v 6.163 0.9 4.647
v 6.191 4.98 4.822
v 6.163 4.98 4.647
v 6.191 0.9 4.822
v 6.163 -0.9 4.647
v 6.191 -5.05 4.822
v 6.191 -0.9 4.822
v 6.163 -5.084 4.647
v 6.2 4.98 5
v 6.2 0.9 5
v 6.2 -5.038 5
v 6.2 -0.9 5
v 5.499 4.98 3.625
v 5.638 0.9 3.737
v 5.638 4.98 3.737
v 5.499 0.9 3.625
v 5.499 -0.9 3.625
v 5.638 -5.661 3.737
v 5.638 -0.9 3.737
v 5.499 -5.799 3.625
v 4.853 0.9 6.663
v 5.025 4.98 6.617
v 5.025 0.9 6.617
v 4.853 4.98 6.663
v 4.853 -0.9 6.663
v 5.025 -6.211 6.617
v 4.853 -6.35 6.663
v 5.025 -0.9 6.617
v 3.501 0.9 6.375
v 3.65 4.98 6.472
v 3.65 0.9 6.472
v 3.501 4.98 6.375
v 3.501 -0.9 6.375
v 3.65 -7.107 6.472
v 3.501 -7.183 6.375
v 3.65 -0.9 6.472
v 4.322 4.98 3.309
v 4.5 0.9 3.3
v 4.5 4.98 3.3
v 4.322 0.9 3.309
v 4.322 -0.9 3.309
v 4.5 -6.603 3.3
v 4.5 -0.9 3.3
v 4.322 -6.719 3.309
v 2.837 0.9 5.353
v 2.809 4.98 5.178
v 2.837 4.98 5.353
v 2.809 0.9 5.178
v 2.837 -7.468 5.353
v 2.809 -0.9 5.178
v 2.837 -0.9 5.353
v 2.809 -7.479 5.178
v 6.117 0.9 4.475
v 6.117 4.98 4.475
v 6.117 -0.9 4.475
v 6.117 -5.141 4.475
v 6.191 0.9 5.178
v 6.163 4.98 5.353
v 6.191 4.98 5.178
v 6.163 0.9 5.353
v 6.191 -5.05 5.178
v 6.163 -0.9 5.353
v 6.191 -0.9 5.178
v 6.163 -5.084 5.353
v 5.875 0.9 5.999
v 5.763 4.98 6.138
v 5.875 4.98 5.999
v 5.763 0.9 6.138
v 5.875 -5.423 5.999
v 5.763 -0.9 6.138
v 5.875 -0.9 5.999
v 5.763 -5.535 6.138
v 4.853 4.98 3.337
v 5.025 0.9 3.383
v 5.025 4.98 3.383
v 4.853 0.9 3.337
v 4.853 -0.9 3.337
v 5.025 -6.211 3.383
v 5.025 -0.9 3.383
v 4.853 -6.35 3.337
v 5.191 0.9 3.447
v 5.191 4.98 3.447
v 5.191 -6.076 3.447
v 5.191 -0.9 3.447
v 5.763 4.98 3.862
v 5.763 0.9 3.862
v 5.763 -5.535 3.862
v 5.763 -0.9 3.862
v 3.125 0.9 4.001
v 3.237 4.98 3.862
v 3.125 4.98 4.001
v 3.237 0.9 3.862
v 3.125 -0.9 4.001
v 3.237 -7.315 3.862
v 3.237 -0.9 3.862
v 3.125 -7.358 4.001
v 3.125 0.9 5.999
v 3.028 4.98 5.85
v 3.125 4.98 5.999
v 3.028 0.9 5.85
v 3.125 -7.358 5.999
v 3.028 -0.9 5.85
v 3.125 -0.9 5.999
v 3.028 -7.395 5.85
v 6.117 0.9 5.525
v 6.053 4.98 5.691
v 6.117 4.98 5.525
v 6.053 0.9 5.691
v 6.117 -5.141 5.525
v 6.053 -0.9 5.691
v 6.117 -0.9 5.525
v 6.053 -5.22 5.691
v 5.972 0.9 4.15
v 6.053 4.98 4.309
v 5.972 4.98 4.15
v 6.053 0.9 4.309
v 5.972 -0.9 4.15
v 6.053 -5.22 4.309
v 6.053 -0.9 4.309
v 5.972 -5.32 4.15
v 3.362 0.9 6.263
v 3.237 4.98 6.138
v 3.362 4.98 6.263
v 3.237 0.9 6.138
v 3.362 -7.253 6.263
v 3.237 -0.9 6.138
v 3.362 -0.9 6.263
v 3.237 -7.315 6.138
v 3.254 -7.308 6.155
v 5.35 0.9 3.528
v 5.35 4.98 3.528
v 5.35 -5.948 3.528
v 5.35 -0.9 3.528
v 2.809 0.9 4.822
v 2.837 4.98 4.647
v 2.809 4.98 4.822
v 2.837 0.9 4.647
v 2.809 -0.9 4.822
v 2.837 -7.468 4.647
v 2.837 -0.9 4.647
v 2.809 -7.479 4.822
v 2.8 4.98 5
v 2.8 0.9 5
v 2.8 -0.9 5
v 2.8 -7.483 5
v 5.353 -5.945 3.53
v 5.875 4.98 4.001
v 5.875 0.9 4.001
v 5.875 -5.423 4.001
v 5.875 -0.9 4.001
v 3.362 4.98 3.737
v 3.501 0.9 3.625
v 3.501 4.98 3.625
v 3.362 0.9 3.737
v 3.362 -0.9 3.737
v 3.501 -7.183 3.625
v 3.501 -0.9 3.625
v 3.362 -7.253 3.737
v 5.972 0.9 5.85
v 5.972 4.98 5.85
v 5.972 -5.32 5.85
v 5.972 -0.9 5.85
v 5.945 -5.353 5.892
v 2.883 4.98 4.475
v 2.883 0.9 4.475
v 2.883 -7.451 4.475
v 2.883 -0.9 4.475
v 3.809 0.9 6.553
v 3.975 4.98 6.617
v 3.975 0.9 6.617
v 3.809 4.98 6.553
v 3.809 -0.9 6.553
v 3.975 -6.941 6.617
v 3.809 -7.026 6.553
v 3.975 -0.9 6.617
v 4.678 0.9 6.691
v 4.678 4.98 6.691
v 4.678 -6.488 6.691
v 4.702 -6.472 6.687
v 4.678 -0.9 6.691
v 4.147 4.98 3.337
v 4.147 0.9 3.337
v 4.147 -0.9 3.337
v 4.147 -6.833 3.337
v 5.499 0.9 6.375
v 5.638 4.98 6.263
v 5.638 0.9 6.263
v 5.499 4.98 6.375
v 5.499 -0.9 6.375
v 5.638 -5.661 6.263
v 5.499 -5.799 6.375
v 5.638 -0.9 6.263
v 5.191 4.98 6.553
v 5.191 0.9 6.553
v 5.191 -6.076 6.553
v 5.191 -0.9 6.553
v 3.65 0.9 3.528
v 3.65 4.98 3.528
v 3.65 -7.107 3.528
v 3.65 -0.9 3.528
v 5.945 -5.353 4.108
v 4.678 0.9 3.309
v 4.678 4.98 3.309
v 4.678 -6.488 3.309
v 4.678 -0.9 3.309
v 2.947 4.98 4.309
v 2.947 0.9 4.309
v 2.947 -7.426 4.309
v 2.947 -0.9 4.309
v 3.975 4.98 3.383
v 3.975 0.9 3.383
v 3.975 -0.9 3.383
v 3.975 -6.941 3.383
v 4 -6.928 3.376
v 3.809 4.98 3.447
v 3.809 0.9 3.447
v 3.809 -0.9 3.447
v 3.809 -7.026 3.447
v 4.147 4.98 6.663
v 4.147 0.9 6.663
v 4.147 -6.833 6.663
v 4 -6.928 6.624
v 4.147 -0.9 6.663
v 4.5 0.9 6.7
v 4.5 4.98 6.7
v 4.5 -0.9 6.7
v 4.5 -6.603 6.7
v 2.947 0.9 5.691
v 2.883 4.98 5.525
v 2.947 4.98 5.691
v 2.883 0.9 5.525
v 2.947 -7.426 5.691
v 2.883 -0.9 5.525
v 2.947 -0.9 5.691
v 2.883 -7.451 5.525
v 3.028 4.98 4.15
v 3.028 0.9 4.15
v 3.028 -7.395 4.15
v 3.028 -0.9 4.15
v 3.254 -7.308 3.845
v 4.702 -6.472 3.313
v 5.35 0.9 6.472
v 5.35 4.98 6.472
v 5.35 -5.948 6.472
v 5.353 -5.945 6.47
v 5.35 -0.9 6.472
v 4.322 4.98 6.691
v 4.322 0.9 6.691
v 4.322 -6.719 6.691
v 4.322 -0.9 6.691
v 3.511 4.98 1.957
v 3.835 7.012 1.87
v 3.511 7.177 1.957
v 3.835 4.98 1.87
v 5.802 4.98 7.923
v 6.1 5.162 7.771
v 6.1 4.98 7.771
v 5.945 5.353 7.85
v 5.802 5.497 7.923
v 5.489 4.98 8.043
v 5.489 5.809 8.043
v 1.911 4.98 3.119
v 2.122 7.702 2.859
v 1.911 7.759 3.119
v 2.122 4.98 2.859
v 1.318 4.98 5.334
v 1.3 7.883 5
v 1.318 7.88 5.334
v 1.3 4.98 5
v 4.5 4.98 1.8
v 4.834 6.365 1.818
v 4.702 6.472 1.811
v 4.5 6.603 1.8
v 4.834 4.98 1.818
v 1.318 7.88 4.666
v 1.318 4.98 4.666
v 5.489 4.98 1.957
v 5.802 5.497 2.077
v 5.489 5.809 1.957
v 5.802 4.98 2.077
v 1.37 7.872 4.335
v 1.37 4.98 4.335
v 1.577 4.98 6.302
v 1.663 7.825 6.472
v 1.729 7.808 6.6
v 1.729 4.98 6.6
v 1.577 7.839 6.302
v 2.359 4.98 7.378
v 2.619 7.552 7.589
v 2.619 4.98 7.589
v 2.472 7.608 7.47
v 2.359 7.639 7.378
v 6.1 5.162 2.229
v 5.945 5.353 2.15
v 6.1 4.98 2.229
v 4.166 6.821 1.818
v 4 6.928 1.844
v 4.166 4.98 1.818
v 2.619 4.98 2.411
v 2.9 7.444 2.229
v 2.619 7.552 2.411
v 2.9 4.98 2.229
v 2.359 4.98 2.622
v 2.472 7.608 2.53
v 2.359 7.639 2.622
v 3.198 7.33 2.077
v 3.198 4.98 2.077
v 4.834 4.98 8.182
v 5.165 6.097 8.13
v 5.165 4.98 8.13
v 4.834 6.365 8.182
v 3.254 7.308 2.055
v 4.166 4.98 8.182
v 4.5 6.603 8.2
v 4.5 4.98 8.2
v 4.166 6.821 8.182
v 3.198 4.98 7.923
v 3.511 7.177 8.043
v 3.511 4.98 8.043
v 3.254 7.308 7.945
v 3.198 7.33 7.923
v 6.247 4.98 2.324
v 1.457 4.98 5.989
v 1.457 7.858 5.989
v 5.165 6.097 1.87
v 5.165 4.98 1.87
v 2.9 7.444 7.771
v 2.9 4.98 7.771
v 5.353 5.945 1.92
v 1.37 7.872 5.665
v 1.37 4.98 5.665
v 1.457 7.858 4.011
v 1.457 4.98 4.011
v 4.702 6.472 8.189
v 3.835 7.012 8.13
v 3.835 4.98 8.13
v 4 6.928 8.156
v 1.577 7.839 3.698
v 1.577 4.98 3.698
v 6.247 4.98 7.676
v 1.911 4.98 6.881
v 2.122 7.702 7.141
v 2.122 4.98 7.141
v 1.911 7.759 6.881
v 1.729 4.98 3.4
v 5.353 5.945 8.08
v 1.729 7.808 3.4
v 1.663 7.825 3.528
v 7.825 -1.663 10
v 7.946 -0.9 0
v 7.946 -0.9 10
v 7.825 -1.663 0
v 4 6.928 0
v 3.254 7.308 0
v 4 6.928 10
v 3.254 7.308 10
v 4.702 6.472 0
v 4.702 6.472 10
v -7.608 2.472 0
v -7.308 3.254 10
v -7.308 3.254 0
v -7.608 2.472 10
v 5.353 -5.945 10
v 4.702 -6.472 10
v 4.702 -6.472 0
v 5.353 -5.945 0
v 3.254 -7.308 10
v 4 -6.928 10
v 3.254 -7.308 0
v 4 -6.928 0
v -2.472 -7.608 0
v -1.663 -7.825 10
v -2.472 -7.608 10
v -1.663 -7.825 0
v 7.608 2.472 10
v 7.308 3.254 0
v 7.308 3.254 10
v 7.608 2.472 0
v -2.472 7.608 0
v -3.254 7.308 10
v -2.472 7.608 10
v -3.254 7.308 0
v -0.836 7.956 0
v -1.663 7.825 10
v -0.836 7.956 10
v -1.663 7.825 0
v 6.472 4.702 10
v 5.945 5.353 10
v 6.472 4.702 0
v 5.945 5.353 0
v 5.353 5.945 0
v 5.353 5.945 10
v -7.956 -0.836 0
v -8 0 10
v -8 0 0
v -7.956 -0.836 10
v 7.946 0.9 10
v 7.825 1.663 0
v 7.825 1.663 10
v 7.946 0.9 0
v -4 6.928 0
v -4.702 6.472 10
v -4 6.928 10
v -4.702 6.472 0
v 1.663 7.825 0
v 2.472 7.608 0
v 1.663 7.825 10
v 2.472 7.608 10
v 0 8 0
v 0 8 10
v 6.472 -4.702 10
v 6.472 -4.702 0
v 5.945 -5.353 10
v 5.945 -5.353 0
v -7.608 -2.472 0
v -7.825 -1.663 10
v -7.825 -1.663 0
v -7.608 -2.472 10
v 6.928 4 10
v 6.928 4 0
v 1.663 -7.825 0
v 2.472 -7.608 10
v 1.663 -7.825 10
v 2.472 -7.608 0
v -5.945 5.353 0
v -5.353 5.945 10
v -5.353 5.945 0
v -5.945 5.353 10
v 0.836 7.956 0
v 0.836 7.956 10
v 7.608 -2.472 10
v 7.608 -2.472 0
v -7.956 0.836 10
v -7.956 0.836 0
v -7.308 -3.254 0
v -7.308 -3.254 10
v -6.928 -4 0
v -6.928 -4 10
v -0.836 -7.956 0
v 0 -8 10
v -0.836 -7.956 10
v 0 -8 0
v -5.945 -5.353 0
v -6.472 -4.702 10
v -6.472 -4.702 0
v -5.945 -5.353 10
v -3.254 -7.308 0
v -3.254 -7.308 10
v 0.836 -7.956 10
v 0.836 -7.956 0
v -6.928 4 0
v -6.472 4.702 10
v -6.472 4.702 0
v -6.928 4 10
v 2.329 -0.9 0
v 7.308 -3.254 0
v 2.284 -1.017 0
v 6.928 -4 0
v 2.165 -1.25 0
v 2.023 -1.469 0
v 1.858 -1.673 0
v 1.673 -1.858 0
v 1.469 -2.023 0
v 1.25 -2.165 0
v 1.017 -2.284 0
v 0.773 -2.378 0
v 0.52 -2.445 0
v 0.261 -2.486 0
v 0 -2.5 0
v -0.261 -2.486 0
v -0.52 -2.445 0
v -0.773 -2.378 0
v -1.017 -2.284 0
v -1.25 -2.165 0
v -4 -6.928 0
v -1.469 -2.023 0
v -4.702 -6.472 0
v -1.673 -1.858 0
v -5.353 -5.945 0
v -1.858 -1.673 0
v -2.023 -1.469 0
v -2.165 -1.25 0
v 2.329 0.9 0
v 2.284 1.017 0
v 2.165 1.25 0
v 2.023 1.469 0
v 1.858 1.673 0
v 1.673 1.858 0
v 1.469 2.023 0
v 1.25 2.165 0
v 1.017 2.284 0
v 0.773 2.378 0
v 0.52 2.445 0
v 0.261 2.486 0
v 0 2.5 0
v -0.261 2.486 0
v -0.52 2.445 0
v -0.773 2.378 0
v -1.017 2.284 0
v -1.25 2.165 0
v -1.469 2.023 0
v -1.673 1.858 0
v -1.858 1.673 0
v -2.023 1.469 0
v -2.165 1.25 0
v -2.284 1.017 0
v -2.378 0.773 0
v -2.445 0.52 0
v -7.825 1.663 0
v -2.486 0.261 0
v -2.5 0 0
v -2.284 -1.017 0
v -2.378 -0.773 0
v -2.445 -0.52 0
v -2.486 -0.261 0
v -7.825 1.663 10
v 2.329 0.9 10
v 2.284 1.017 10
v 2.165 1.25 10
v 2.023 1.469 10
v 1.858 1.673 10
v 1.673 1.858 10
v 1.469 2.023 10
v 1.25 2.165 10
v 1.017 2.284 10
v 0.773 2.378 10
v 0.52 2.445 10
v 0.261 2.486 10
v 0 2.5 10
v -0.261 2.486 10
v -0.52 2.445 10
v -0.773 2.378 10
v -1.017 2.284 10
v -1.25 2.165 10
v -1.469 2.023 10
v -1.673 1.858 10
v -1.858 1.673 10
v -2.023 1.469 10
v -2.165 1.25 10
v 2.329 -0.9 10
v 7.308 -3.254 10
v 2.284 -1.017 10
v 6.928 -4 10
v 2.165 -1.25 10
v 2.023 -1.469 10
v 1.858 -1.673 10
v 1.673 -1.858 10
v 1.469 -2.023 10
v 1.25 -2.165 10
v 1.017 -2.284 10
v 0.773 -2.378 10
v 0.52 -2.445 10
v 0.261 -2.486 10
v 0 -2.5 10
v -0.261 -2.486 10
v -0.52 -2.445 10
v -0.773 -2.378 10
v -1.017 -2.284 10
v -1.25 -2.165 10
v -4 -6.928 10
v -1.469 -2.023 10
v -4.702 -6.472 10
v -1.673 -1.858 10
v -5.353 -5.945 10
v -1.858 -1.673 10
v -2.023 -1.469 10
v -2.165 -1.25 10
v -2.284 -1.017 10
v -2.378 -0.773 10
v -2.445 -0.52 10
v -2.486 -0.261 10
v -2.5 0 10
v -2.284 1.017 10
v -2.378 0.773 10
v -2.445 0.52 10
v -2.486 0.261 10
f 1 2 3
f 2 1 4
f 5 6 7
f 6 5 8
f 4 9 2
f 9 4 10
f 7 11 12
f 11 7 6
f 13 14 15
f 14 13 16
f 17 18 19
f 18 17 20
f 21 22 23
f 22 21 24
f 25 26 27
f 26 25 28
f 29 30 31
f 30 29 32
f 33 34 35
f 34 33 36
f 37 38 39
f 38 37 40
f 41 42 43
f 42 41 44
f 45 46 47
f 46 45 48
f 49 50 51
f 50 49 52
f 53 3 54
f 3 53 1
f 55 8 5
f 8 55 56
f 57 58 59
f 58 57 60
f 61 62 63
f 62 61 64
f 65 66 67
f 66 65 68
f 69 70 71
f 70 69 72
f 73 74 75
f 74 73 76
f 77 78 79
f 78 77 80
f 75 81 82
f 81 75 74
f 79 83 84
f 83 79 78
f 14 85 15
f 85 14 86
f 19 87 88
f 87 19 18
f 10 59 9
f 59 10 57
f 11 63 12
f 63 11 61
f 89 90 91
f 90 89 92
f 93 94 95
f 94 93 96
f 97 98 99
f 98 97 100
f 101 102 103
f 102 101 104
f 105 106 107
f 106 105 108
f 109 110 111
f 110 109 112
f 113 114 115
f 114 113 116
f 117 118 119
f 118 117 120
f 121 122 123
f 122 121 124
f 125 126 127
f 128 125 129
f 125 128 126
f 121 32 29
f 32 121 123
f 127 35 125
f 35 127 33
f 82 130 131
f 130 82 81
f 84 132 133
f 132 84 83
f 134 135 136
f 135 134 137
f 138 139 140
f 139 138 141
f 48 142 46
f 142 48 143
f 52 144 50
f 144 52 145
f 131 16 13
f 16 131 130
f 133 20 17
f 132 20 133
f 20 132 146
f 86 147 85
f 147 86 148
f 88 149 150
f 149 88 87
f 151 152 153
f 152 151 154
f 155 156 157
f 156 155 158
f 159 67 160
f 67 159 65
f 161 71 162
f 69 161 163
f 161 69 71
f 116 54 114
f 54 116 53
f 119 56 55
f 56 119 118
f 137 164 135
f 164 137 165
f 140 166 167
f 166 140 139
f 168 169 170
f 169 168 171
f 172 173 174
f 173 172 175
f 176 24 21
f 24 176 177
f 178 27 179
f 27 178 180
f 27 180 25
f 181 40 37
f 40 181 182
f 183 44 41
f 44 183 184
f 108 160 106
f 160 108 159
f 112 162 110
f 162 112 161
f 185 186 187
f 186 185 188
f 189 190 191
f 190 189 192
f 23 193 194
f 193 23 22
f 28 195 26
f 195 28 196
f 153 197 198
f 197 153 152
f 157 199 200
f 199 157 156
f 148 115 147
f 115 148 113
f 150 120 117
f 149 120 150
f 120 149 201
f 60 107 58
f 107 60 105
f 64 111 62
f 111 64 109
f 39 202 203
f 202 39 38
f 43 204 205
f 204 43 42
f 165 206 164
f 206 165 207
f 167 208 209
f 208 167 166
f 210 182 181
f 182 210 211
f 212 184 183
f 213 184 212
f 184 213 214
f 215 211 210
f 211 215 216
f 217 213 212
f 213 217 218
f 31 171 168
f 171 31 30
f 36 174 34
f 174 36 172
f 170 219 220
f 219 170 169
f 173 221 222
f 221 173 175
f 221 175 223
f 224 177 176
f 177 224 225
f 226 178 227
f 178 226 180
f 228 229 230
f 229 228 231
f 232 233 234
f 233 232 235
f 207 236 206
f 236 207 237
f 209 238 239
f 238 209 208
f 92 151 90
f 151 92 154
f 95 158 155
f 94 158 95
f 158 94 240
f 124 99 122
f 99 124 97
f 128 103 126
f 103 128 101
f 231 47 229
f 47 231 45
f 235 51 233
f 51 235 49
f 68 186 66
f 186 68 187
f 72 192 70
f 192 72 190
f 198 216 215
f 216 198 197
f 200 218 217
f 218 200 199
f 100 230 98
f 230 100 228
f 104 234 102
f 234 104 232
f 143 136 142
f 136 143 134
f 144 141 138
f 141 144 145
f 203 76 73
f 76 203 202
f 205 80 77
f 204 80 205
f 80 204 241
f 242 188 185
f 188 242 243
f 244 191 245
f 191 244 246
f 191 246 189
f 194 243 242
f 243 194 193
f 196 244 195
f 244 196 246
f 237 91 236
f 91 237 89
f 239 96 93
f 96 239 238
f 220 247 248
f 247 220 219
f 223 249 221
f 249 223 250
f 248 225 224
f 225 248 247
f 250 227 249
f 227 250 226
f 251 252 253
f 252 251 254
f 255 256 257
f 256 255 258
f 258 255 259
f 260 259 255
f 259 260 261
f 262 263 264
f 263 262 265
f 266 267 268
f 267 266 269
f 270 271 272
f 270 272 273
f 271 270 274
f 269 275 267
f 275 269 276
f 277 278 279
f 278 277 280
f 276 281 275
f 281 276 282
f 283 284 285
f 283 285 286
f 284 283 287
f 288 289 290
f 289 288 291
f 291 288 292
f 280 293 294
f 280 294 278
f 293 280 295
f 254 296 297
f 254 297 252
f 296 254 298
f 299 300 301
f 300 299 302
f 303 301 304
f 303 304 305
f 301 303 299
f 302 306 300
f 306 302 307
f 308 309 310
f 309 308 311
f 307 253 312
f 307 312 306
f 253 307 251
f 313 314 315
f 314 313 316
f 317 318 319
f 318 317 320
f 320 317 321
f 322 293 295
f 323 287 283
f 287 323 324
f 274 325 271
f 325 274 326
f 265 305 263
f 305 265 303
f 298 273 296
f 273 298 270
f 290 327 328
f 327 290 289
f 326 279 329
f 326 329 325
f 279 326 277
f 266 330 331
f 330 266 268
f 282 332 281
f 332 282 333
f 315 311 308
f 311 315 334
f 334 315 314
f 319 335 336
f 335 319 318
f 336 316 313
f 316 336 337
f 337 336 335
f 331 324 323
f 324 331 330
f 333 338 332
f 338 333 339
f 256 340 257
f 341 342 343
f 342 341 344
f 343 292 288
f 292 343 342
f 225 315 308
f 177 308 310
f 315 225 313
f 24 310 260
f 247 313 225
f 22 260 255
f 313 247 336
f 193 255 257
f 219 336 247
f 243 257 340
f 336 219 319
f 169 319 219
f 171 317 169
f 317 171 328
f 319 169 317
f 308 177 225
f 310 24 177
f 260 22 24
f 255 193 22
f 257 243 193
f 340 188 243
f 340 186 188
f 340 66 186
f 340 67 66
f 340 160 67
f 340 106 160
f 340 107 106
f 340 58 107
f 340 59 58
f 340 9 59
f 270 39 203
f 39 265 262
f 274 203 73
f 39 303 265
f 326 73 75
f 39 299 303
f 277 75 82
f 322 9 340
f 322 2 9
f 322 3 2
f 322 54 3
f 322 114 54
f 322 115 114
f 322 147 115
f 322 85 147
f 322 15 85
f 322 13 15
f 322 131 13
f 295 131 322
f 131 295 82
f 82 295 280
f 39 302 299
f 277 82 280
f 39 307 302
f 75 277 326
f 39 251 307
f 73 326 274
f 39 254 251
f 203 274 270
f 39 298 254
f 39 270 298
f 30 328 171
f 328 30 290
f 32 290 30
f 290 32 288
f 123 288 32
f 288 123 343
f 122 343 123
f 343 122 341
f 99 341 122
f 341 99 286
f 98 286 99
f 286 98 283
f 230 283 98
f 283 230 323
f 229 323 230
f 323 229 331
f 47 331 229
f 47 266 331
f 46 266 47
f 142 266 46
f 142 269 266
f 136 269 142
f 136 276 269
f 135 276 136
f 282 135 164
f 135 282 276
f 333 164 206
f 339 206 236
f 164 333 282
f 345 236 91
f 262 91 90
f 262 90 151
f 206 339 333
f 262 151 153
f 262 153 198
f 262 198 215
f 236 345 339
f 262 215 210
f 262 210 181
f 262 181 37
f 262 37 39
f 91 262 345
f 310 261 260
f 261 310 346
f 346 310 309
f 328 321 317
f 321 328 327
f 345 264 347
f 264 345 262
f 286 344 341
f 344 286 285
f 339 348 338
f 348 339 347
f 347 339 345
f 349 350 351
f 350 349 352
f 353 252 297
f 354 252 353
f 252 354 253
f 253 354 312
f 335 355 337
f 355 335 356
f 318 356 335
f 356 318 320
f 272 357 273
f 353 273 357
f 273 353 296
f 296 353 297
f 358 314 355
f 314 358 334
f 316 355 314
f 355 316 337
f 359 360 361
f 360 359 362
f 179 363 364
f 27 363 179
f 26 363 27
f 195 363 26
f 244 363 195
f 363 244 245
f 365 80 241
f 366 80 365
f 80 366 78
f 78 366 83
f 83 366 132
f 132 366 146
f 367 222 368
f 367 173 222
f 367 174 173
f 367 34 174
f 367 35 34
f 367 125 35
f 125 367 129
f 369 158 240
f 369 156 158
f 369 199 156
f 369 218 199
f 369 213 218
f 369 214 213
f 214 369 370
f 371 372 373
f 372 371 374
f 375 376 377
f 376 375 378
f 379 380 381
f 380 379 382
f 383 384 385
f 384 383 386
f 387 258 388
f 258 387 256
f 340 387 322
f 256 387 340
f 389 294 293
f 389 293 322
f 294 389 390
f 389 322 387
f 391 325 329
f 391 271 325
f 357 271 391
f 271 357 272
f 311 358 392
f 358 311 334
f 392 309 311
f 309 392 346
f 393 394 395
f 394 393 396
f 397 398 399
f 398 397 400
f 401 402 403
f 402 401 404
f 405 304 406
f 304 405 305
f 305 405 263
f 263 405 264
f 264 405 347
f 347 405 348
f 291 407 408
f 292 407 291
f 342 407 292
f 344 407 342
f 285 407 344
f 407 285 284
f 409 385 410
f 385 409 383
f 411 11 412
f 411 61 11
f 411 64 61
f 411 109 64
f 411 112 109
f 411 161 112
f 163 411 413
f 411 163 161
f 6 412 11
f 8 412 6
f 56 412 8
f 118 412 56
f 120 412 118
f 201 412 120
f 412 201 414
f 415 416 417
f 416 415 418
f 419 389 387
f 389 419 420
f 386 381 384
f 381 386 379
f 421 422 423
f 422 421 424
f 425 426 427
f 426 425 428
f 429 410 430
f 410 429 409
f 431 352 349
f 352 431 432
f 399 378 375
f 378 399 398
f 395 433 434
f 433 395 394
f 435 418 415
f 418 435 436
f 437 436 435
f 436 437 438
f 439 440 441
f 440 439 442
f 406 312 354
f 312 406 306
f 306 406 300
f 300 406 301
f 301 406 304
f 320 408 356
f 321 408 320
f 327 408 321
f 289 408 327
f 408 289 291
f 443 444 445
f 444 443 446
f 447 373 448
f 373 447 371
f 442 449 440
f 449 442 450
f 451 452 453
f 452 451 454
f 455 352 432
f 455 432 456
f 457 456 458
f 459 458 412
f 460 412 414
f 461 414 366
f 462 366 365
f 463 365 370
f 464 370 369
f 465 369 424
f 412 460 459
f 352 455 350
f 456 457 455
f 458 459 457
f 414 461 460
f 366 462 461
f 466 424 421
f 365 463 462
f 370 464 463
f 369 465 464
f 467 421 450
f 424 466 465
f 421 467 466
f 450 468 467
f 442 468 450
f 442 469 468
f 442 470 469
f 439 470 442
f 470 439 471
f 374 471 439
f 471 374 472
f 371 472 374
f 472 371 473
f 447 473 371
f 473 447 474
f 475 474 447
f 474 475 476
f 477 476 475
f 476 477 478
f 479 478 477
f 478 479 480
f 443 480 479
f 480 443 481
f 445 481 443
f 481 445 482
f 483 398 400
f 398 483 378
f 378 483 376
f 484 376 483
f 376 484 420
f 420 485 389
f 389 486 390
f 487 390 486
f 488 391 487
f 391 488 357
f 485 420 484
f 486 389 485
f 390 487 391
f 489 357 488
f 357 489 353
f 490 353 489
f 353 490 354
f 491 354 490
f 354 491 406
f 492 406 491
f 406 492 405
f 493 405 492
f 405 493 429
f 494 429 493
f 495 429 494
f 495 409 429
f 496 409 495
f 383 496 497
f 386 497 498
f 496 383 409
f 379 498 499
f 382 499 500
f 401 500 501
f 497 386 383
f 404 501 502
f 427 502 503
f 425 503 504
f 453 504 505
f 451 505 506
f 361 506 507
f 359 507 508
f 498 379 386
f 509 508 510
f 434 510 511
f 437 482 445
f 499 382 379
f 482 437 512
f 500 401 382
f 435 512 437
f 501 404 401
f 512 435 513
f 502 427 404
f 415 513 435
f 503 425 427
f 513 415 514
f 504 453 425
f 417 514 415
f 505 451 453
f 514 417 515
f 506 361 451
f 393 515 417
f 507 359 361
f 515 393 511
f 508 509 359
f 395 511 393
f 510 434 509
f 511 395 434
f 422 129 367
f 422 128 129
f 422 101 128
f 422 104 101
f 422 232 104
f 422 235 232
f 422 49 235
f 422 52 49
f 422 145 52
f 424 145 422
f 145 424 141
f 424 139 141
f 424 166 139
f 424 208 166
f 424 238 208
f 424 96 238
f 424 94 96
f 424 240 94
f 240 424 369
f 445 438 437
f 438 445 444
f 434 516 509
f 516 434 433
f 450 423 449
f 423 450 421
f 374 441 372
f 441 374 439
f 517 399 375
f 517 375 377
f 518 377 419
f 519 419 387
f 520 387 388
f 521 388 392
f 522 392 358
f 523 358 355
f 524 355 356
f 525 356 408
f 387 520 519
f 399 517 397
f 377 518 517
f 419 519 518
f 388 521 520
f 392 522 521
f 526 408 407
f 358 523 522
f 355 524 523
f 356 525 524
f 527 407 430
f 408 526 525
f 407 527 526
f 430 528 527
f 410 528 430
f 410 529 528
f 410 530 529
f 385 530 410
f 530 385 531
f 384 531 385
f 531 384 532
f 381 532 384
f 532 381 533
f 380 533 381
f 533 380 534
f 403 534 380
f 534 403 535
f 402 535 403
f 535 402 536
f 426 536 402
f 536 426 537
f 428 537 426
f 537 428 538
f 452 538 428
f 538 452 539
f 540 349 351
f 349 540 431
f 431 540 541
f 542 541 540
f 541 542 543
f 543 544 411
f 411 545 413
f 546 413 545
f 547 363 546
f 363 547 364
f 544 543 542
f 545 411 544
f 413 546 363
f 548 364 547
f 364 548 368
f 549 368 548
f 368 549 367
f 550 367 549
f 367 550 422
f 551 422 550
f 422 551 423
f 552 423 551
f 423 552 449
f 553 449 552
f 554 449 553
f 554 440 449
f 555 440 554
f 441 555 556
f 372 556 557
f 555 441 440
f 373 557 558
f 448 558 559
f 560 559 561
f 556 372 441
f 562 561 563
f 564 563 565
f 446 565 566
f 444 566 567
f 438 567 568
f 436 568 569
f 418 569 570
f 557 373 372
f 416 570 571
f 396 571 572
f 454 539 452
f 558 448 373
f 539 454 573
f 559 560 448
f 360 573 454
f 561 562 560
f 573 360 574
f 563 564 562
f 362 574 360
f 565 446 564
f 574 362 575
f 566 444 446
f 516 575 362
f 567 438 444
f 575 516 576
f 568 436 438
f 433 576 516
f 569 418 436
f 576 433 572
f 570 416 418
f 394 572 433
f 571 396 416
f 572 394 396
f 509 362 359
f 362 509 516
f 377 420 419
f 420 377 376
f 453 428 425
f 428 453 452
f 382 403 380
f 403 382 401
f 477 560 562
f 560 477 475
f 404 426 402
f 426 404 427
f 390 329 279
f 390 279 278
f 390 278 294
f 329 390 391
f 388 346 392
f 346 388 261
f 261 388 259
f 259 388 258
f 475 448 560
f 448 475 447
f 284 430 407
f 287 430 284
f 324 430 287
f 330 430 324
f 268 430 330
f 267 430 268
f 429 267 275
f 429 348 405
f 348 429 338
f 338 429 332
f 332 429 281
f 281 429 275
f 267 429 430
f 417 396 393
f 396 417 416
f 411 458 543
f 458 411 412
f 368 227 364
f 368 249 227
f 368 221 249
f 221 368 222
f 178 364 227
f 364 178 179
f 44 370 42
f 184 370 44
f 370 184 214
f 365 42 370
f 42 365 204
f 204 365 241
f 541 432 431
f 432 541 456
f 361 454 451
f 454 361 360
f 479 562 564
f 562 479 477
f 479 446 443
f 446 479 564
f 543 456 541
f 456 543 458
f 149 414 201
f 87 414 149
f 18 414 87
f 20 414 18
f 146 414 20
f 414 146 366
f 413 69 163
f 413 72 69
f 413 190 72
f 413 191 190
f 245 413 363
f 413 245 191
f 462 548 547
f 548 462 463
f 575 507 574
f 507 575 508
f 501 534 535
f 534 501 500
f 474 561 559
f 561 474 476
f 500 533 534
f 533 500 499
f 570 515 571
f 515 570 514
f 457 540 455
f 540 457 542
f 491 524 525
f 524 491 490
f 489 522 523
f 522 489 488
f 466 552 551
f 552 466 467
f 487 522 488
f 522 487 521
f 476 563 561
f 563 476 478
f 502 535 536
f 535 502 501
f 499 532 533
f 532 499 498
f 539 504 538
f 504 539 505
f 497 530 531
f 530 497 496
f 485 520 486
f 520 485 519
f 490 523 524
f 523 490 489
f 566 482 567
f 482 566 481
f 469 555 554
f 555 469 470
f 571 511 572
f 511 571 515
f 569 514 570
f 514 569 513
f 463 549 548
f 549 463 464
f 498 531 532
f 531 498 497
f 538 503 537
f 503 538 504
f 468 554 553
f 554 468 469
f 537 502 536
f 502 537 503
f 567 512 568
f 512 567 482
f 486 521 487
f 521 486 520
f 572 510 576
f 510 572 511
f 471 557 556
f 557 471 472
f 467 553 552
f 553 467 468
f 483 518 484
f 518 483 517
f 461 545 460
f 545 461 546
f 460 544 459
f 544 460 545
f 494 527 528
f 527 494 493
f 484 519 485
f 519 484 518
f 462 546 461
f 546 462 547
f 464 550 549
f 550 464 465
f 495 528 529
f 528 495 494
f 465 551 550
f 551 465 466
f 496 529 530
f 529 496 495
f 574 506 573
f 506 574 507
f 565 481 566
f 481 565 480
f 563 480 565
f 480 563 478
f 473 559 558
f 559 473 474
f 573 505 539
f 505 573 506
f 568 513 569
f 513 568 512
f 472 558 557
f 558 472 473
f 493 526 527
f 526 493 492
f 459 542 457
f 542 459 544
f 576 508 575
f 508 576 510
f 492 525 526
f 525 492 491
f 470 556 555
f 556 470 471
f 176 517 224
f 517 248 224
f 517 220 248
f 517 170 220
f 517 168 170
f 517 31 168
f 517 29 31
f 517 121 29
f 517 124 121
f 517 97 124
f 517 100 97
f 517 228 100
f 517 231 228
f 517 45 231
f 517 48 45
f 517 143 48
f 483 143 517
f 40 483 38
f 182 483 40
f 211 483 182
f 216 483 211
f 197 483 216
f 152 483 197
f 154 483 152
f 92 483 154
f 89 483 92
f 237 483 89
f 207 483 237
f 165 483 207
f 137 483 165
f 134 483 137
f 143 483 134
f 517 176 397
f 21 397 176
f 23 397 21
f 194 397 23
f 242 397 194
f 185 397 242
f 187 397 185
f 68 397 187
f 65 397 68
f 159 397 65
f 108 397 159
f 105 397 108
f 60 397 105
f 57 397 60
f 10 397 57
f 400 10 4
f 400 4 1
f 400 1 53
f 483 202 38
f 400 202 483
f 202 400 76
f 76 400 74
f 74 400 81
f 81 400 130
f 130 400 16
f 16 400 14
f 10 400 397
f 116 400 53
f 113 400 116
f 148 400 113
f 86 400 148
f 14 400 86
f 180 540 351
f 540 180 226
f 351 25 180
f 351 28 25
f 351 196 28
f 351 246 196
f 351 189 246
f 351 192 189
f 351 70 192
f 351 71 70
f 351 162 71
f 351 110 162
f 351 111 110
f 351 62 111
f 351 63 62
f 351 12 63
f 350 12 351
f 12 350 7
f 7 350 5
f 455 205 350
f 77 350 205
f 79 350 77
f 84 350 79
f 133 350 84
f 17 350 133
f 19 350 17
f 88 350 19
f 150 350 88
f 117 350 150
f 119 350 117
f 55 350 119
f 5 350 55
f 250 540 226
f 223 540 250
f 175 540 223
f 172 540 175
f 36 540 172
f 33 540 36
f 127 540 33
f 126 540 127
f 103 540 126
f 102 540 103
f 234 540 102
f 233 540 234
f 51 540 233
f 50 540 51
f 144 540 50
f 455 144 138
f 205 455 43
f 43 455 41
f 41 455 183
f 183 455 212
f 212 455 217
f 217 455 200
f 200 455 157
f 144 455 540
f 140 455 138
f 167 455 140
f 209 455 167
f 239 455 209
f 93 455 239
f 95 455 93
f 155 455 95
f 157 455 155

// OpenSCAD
// Split shaft collar 5 mm: one-piece C-style split shaft collar.
$fn = 60;
eps = 0.02;
shaft_d = 5;
outer_d = 16;
width = 10;
slit_w = 1.8;
clamp_screw_d = 3.4;
head_d = 6.4;

module clamp_bore() {
    translate([outer_d / 2 - 3.5, -outer_d / 2 - eps, width / 2])
        rotate([-90, 0, 0]) cylinder(d = clamp_screw_d, h = outer_d + 2 * eps);
    translate([outer_d / 2 - 3.5, outer_d / 2 - 3 - eps, width / 2])
        rotate([-90, 0, 0]) cylinder(d = head_d, h = 3 + 2 * eps);
}

difference() {
    cylinder(d = outer_d, h = width);
    translate([0, 0, -eps]) cylinder(d = shaft_d, h = width + 2 * eps);
    translate([0, -slit_w / 2, -eps]) cube([outer_d / 2 + eps, slit_w, width + 2 * eps]);
    clamp_bore();
}
